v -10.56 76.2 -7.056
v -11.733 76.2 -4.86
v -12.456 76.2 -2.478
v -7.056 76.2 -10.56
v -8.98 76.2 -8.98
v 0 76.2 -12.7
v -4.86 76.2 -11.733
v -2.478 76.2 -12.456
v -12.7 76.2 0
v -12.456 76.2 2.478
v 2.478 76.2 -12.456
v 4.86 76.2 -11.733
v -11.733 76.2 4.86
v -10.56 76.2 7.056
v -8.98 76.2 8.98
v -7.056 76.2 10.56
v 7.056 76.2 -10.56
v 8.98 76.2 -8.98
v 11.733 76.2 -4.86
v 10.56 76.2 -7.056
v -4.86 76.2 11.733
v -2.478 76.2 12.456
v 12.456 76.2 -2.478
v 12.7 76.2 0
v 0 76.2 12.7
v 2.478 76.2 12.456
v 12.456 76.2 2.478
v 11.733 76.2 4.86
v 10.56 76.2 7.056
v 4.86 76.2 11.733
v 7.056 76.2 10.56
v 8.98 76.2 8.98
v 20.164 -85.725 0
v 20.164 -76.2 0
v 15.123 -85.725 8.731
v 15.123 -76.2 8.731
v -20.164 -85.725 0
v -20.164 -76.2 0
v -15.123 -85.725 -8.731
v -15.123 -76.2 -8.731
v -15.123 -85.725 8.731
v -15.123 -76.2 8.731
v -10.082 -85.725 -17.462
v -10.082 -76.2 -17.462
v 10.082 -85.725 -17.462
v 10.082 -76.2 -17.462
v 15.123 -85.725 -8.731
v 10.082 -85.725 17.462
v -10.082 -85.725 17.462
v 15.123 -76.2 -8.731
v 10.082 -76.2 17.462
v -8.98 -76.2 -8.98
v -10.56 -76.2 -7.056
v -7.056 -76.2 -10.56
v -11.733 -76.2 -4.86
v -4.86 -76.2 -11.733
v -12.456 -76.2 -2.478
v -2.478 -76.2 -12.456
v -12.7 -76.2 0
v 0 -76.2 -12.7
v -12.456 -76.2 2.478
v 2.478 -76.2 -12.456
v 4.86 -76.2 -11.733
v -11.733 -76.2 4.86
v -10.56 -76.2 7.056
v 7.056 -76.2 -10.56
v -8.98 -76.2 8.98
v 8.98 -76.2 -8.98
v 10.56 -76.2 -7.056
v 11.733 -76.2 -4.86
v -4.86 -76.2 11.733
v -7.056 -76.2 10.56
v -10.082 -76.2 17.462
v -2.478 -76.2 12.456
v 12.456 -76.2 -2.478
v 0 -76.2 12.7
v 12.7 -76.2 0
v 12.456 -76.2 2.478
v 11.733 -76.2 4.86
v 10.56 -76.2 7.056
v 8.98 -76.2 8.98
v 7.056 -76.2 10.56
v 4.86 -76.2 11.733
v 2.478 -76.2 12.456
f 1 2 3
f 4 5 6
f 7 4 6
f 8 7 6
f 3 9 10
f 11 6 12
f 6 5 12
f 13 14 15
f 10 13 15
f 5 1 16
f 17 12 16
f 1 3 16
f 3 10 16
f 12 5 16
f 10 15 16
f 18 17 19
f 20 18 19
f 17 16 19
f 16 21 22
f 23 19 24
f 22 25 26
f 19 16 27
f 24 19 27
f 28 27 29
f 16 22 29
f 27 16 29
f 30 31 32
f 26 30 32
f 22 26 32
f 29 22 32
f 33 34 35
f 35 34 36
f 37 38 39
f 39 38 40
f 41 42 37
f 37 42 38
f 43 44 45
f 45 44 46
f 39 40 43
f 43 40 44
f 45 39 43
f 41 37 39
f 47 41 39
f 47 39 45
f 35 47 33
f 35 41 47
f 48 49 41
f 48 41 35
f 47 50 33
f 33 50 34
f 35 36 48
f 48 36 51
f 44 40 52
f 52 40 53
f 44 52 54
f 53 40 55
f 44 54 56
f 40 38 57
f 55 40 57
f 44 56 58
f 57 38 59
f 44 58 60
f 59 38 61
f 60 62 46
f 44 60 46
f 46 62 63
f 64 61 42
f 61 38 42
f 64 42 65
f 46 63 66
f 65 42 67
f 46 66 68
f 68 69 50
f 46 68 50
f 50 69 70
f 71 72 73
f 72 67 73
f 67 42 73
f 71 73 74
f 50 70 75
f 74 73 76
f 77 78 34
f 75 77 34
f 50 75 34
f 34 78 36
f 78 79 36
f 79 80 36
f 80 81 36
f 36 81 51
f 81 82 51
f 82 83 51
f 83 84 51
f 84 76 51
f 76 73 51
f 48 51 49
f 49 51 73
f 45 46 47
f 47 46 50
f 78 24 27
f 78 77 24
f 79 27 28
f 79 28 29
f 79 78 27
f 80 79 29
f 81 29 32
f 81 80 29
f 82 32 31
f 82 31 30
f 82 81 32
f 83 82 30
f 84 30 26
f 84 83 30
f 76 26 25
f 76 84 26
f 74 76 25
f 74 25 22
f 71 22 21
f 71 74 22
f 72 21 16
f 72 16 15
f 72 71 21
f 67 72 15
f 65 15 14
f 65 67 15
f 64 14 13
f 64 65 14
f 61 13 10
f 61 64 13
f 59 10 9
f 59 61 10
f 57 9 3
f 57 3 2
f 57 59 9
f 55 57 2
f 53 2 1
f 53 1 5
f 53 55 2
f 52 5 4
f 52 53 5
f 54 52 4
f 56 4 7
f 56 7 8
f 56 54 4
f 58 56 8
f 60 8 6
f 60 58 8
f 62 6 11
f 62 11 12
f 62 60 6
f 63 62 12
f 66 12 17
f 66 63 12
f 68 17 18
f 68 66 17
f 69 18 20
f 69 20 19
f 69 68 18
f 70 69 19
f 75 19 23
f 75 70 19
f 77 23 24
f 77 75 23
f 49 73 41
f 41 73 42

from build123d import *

# Parameters (mm, degrees)
F0_R     = 12.7
F1_DEPTH = 76.2
F2_R     = 12.7
F3_DEPTH = 9.525


with BuildPart() as f1:
    # F0 (on Front) → F1 (new body, symmetric)
    with BuildSketch(Plane.XZ):
        Circle(F0_R)
    extrude(amount=F1_DEPTH, both=True)

    # F2 (on face) → F3 (join)
    with BuildSketch(Plane.XZ.offset(76.2)):
        with BuildLine():
            ThreePointArc((15.1229686772, -8.7312498898), (16.867479758, -4.5196275136), (17.4625, 0))
            ThreePointArc((17.4625, 0), (16.8674797672, 4.5196274796), (15.1229687125, 8.7312498287))
            ThreePointArc((15.1229687125, 8.7312498287), (8.7312500857, 15.1229685641), (0, 17.4625))
            ThreePointArc((0, 17.4625), (-8.7312499563, 15.1229686388), (-15.1229685631, 8.7312500875))
            ThreePointArc((-15.1229685631, 8.7312500875), (-17.4625, -1.494e-07), (-15.1229684137, -8.7312503463))
            ThreePointArc((-15.1229684137, -8.7312503463), (-8.7312498116, -15.1229687224), (3.53e-08, -17.4625))
            ThreePointArc((3.53e-08, -17.4625), (8.7312500704, -15.122968573), (15.1229686772, -8.7312498898))
        make_face()
        Circle(F2_R, mode=Mode.SUBTRACT)
        Circle(F2_R)
        with BuildLine():
            ThreePointArc((0, 17.4625), (8.7312500857, 15.1229685641), (15.1229687125, 8.7312498287))
            Line((15.1229687125, 8.7312498287), (10.0819790757, 17.4625))
            Line((10.0819790757, 17.4625), (0, 17.4625))
        make_face()
        with BuildLine():
            ThreePointArc((-15.1229685631, 8.7312500875), (-8.7312499563, 15.1229686388), (0, 17.4625))
            Line((0, 17.4625), (-10.0819790757, 17.4625))
            Line((-10.0819790757, 17.4625), (-15.1229685631, 8.7312500875))
        make_face()
        with BuildLine():
            ThreePointArc((15.1229687125, 8.7312498287), (16.8674797672, 4.5196274796), (17.4625, 0))
            ThreePointArc((17.4625, 0), (16.867479758, -4.5196275136), (15.1229686772, -8.7312498898))
            Line((15.1229686772, -8.7312498898), (20.1639581514, 0))
            Line((20.1639581514, 0), (15.1229687125, 8.7312498287))
        make_face()
        with BuildLine():
            Line((10.0819790757, -17.4625), (15.1229686772, -8.7312498898))
            ThreePointArc((15.1229686772, -8.7312498898), (8.7312500704, -15.122968573), (3.53e-08, -17.4625))
            Line((3.53e-08, -17.4625), (10.0819790757, -17.4625))
        make_face()
        with BuildLine():
            Line((-10.0819790757, -17.4625), (3.53e-08, -17.4625))
            ThreePointArc((3.53e-08, -17.4625), (-8.7312498116, -15.1229687224), (-15.1229684137, -8.7312503463))
            Line((-15.1229684137, -8.7312503463), (-10.0819790757, -17.4625))
        make_face()
        with BuildLine():
            ThreePointArc((-15.1229684137, -8.7312503463), (-17.4625, -1.494e-07), (-15.1229685631, 8.7312500875))
            Line((-15.1229685631, 8.7312500875), (-20.1639581514, 0))
            Line((-20.1639581514, 0), (-15.1229684137, -8.7312503463))
        make_face()
    extrude(amount=F3_DEPTH)


solid = f1.part
